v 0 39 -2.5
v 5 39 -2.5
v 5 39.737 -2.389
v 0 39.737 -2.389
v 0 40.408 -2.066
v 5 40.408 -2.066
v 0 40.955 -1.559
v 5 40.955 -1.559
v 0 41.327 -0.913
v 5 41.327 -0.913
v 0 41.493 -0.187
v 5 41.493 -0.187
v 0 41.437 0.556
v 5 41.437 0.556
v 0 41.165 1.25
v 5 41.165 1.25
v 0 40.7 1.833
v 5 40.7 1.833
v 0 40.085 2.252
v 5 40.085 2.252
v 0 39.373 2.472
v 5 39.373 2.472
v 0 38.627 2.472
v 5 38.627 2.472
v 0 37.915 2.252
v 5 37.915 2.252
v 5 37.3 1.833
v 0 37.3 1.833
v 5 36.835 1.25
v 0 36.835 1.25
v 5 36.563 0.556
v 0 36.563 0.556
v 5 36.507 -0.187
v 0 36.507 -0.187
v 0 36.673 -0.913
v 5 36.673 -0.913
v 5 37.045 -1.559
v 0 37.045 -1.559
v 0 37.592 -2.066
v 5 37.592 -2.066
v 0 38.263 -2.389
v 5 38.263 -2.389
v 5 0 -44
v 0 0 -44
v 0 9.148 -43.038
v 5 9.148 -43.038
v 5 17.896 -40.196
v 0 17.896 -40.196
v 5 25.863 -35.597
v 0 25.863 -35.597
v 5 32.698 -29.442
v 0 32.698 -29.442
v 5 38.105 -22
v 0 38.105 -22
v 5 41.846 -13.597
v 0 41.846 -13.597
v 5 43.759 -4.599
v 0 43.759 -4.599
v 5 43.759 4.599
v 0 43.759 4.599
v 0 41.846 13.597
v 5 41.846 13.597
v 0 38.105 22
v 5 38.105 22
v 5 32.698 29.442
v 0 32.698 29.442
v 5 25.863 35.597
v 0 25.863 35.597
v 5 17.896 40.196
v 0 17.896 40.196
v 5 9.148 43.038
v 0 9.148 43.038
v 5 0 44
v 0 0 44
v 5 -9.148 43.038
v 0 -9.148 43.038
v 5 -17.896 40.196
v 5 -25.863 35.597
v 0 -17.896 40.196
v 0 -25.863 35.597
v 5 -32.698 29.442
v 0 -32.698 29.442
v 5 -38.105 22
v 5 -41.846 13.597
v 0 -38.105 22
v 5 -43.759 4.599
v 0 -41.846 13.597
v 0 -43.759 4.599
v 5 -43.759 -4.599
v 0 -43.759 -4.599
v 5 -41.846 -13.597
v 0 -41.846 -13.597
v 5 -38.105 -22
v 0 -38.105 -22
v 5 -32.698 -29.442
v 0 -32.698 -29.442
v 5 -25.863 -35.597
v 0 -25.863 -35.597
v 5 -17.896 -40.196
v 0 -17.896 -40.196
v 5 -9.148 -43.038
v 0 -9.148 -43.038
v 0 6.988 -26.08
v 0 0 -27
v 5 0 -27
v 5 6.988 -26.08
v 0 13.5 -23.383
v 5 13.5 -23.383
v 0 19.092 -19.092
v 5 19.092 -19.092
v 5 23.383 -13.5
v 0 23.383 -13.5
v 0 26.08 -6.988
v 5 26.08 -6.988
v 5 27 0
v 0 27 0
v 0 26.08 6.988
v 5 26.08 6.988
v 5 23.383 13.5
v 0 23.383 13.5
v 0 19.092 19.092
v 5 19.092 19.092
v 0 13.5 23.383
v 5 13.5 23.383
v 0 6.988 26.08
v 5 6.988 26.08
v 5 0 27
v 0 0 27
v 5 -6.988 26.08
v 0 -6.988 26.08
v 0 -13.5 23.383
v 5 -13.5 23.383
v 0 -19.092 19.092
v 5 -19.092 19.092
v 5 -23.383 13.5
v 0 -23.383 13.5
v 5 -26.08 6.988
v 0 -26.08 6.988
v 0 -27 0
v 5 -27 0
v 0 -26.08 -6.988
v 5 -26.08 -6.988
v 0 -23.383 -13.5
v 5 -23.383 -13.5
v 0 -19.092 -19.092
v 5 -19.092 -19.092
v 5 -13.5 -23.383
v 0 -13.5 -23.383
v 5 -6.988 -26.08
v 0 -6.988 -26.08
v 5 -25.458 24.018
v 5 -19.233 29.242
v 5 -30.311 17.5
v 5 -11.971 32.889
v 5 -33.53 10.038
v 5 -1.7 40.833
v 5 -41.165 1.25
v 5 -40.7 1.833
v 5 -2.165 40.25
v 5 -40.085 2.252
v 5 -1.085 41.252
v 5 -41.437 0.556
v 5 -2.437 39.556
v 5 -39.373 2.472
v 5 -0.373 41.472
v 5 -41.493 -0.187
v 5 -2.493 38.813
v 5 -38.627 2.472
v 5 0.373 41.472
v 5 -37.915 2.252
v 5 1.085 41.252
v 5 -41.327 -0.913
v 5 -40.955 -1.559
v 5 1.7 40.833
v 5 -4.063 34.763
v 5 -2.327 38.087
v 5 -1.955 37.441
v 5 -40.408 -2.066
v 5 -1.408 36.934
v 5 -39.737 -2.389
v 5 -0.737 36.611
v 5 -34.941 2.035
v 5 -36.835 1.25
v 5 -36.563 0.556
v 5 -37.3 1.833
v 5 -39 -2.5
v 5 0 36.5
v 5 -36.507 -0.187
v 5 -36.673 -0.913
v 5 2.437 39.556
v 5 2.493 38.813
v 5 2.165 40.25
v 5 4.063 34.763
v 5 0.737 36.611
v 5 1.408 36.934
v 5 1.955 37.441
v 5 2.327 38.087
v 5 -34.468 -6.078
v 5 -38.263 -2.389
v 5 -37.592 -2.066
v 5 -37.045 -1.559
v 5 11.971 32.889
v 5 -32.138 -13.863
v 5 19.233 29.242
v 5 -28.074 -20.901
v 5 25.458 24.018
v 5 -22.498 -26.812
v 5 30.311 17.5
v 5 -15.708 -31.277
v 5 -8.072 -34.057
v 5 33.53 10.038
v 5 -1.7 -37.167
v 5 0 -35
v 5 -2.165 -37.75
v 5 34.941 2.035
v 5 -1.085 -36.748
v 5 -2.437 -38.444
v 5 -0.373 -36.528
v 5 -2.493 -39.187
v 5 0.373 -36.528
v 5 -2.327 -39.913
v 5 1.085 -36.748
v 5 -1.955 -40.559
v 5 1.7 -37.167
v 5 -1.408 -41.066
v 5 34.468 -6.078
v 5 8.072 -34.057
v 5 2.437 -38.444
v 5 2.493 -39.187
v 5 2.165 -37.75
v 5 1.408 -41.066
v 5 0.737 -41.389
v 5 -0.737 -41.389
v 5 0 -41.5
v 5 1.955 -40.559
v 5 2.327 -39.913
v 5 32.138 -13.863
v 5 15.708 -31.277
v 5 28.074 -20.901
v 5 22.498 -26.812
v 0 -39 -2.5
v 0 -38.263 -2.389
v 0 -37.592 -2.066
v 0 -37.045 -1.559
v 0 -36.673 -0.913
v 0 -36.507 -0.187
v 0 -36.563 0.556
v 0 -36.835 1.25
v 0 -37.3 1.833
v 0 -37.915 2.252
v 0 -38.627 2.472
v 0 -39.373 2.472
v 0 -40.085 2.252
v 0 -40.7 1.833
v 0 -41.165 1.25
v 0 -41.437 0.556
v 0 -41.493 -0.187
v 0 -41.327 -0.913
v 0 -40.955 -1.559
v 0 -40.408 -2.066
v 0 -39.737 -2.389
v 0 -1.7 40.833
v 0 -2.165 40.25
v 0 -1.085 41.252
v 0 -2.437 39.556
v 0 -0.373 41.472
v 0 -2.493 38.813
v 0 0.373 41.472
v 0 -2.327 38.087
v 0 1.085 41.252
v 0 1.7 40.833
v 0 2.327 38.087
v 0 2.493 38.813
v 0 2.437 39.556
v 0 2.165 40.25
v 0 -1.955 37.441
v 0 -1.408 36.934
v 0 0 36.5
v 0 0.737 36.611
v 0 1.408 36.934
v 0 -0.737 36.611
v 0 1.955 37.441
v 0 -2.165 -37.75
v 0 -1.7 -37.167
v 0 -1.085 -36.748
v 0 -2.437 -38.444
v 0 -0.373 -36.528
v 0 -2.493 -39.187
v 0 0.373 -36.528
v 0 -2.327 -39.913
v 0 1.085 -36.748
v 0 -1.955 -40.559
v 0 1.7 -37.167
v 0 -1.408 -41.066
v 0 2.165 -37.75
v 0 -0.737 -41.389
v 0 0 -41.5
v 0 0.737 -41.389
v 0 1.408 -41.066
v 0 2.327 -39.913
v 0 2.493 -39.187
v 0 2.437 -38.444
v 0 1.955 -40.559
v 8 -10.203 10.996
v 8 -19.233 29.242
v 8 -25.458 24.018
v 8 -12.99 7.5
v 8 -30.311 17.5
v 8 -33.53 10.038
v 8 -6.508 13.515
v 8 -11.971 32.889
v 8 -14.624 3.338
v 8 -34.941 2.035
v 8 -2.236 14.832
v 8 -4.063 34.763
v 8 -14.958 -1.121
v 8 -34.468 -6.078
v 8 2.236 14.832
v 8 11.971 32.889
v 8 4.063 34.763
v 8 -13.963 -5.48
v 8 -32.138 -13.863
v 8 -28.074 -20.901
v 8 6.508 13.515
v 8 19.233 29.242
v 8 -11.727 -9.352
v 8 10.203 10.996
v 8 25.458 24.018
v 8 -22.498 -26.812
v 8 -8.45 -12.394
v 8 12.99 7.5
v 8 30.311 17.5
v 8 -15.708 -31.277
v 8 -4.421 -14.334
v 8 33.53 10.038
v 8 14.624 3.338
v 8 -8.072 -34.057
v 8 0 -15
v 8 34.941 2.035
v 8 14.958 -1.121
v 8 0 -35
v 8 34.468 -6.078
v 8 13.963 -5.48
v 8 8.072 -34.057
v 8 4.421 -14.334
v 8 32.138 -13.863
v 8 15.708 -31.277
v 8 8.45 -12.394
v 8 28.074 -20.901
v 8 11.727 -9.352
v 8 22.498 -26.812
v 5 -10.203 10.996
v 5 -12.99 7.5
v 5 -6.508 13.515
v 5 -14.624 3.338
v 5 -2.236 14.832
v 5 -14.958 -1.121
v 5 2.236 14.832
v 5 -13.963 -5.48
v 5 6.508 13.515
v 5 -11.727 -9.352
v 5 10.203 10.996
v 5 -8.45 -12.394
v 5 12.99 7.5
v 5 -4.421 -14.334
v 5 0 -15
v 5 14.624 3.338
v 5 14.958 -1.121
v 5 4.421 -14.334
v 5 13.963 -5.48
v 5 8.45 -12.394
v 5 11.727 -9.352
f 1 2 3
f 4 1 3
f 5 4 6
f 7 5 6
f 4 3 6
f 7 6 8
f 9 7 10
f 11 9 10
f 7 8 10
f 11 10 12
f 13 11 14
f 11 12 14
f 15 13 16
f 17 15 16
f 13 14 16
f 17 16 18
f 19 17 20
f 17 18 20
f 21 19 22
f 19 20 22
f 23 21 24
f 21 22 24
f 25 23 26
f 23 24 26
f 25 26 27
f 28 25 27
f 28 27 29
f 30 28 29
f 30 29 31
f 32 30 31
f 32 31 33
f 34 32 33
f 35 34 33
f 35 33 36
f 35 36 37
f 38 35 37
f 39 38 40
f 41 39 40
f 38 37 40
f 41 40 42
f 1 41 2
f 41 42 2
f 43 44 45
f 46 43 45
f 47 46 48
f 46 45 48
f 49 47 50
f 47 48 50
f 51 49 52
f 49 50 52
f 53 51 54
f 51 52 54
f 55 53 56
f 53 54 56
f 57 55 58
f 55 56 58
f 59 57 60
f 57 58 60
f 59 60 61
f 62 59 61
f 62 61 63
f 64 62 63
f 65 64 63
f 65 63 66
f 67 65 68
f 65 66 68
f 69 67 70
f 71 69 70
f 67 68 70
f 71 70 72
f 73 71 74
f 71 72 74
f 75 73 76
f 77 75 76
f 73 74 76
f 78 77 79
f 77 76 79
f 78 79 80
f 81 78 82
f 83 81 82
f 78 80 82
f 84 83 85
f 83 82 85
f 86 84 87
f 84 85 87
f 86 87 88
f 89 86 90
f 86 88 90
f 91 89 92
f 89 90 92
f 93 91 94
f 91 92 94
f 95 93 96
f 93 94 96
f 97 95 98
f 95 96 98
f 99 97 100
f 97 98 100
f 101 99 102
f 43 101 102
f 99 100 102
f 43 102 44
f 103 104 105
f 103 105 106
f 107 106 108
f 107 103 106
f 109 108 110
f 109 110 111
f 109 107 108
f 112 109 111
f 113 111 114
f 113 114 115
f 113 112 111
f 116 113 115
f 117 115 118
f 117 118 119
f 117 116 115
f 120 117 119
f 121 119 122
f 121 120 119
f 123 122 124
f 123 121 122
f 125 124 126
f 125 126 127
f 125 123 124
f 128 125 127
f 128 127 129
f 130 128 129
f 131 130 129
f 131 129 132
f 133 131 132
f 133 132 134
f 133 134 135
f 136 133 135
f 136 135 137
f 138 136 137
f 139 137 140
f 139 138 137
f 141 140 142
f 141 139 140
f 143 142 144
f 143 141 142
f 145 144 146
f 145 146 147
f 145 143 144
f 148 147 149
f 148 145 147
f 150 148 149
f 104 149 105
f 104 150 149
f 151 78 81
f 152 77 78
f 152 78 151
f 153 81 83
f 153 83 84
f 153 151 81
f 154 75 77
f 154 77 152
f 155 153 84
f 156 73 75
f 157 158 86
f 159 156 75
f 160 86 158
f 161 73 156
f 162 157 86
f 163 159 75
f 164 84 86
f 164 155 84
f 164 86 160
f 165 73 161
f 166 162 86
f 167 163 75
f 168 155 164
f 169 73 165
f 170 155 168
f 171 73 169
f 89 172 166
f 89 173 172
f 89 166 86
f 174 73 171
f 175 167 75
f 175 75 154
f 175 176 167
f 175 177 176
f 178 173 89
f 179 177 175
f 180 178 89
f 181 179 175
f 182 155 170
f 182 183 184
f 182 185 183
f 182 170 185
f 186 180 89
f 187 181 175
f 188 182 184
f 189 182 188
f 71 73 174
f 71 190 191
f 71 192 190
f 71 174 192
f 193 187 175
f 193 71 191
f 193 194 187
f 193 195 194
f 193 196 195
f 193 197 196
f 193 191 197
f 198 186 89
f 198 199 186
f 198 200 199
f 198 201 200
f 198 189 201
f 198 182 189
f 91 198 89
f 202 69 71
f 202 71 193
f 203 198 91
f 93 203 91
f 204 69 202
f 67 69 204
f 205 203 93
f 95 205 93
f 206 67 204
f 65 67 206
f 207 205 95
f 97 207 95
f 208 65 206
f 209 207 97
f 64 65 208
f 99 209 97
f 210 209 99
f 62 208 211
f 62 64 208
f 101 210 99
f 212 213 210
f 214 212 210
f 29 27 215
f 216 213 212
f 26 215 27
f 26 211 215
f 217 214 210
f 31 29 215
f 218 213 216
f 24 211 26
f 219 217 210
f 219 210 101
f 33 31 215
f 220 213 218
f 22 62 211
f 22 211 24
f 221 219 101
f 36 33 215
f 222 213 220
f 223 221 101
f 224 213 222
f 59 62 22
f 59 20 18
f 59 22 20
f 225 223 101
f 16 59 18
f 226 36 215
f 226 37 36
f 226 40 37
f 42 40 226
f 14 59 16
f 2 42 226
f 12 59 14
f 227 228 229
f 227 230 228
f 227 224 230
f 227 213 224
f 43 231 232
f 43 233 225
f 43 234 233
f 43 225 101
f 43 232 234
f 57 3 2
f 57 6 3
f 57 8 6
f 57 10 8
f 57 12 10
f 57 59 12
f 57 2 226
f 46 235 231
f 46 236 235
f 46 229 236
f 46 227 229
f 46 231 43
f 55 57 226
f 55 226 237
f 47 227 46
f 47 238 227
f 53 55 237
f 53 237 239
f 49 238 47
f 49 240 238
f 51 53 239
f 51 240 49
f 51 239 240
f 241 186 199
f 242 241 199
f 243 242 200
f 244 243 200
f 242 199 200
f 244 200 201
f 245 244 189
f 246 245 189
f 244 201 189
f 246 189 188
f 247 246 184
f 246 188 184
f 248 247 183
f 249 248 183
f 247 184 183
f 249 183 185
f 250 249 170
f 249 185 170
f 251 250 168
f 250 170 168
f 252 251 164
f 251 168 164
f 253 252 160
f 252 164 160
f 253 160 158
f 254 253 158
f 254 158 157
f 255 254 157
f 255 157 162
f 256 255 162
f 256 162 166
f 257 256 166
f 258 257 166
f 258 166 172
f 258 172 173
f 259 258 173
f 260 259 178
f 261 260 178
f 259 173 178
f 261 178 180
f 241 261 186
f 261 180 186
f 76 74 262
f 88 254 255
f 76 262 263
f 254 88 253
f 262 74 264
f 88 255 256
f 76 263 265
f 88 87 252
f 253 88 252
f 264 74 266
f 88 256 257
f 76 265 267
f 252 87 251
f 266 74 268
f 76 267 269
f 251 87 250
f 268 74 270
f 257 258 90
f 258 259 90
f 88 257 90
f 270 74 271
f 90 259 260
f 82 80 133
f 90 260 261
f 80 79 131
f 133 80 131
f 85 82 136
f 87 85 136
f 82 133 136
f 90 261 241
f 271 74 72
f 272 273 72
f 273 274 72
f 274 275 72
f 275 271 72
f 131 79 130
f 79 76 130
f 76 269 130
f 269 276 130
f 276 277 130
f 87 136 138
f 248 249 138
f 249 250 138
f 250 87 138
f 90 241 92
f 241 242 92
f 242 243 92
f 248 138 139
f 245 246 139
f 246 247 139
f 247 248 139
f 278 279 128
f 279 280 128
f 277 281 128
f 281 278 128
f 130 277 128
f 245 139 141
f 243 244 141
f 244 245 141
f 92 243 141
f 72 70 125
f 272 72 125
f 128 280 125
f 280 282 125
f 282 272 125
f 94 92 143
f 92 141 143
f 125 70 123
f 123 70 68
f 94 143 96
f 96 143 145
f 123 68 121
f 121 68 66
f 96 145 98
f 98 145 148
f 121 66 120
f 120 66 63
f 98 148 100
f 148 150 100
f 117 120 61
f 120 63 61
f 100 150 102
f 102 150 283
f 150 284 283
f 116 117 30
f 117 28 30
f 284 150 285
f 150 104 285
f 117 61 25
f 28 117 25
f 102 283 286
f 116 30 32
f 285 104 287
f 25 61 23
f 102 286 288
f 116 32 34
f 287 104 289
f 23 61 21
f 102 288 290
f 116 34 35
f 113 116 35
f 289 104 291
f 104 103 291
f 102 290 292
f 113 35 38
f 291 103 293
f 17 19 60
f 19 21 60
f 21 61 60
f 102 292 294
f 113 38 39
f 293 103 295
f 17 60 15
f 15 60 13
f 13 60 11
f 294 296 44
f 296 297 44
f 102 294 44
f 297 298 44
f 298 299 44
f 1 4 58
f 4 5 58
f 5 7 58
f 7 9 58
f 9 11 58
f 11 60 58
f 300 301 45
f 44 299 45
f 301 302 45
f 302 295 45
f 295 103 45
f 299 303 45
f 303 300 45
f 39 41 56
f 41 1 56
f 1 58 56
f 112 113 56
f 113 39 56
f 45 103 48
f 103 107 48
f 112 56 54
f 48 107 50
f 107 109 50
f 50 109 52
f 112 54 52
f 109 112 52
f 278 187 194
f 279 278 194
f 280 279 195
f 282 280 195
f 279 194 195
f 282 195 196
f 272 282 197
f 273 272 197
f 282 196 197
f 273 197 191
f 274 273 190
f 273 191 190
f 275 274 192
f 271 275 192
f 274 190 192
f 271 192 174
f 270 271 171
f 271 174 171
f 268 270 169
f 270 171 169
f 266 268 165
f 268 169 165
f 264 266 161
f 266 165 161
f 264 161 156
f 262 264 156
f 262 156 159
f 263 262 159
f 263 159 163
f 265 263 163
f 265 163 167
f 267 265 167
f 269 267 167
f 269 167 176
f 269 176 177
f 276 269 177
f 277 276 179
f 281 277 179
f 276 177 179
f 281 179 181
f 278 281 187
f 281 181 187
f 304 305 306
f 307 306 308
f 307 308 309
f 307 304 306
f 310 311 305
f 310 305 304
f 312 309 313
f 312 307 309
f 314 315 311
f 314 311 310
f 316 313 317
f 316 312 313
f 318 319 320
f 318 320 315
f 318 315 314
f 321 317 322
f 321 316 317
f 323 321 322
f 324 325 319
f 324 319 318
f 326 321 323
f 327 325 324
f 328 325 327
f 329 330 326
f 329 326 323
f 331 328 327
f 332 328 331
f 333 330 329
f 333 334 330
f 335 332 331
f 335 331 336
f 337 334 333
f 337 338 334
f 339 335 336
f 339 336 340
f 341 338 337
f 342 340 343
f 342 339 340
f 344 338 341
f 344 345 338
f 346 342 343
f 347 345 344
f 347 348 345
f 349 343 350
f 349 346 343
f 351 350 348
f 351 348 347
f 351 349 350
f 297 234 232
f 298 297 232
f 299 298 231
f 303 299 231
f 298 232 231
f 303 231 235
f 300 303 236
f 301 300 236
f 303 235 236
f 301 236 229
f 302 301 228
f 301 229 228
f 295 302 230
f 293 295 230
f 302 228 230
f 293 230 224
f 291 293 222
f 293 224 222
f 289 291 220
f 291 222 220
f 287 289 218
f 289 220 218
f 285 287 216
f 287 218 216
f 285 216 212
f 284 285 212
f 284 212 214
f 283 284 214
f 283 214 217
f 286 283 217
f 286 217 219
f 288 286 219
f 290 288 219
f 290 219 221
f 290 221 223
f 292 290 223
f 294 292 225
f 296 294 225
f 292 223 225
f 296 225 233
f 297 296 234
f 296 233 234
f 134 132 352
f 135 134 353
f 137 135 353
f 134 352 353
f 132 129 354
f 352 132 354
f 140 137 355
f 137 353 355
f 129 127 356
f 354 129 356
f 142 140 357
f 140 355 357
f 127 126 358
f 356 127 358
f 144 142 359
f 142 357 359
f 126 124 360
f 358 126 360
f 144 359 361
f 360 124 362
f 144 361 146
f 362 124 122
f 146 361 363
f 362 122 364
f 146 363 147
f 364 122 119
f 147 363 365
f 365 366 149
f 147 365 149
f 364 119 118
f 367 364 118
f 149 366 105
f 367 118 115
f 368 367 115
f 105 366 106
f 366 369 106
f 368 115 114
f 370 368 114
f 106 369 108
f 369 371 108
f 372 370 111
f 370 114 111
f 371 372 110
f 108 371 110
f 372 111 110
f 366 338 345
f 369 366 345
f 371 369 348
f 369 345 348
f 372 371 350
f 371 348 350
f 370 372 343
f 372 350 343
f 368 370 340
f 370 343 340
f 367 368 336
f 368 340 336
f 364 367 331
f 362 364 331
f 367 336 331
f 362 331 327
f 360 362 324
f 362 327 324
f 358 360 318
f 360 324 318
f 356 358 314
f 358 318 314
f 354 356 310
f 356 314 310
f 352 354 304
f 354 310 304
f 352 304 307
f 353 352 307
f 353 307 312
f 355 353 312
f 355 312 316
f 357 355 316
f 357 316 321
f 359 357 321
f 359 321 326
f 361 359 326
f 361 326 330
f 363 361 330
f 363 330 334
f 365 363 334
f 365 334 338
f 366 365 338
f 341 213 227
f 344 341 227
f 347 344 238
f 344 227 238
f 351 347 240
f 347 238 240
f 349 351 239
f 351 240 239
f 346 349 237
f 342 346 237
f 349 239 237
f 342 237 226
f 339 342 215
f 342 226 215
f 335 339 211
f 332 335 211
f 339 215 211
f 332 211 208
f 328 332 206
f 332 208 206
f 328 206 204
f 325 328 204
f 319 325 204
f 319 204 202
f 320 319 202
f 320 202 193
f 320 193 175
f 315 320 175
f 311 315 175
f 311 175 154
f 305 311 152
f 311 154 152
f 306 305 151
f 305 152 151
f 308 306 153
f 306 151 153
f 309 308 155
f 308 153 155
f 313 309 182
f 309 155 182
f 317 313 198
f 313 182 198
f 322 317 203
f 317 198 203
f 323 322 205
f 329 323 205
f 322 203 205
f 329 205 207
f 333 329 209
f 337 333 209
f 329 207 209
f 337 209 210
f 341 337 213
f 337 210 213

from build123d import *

# Parameters (mm, degrees)
SKETCH_1_R          = 44
SKETCH_1_R_2        = 27
EXTRUDE_1_DEPTH     = 5
SKETCH_2_R          = 35
EXTRUDE_2_DEPTH     = 3
SKETCH_3_R          = 2.5
CUT_EXTRUDE_1_DEPTH = 5
SKETCH_4_R          = 15
CUT_EXTRUDE_2_DEPTH = 8


with BuildPart() as part:
    # 草图1 → 凸台-拉伸1 (new body)
    with BuildSketch(Plane(origin=(0, 0, 0), x_dir=(0, 0, -1), z_dir=(1, 0, 0))):
        Circle(SKETCH_1_R)
        Circle(SKETCH_1_R_2, mode=Mode.SUBTRACT)
    extrude(amount=EXTRUDE_1_DEPTH)

    # 草图2 → 凸台-拉伸2 (add)
    with BuildSketch(Plane(origin=(5, 0, 0), x_dir=(0, 0, -1), z_dir=(1, 0, 0))):
        Circle(SKETCH_2_R)
    extrude(amount=EXTRUDE_2_DEPTH)

    # 草图3 → 切除-拉伸1 (cut)
    with BuildSketch(Plane(origin=(5, 0, 0), x_dir=(0, 0, -1), z_dir=(1, 0, 0))):
        with Locations((0, 39)):
            Circle(SKETCH_3_R)
        with Locations((39, 0)):
            Circle(SKETCH_3_R)
        with Locations((0, -39)):
            Circle(SKETCH_3_R)
        with Locations((-39, 0)):
            Circle(SKETCH_3_R)
    extrude(amount=-CUT_EXTRUDE_1_DEPTH, mode=Mode.SUBTRACT)

    # 草图4 → 切除-拉伸2 (cut)
    with BuildSketch(Plane(origin=(8, 0, 0), x_dir=(0, 0, -1), z_dir=(1, 0, 0))):
        Circle(SKETCH_4_R)
    extrude(amount=-CUT_EXTRUDE_2_DEPTH, mode=Mode.SUBTRACT)


solid = part.part
